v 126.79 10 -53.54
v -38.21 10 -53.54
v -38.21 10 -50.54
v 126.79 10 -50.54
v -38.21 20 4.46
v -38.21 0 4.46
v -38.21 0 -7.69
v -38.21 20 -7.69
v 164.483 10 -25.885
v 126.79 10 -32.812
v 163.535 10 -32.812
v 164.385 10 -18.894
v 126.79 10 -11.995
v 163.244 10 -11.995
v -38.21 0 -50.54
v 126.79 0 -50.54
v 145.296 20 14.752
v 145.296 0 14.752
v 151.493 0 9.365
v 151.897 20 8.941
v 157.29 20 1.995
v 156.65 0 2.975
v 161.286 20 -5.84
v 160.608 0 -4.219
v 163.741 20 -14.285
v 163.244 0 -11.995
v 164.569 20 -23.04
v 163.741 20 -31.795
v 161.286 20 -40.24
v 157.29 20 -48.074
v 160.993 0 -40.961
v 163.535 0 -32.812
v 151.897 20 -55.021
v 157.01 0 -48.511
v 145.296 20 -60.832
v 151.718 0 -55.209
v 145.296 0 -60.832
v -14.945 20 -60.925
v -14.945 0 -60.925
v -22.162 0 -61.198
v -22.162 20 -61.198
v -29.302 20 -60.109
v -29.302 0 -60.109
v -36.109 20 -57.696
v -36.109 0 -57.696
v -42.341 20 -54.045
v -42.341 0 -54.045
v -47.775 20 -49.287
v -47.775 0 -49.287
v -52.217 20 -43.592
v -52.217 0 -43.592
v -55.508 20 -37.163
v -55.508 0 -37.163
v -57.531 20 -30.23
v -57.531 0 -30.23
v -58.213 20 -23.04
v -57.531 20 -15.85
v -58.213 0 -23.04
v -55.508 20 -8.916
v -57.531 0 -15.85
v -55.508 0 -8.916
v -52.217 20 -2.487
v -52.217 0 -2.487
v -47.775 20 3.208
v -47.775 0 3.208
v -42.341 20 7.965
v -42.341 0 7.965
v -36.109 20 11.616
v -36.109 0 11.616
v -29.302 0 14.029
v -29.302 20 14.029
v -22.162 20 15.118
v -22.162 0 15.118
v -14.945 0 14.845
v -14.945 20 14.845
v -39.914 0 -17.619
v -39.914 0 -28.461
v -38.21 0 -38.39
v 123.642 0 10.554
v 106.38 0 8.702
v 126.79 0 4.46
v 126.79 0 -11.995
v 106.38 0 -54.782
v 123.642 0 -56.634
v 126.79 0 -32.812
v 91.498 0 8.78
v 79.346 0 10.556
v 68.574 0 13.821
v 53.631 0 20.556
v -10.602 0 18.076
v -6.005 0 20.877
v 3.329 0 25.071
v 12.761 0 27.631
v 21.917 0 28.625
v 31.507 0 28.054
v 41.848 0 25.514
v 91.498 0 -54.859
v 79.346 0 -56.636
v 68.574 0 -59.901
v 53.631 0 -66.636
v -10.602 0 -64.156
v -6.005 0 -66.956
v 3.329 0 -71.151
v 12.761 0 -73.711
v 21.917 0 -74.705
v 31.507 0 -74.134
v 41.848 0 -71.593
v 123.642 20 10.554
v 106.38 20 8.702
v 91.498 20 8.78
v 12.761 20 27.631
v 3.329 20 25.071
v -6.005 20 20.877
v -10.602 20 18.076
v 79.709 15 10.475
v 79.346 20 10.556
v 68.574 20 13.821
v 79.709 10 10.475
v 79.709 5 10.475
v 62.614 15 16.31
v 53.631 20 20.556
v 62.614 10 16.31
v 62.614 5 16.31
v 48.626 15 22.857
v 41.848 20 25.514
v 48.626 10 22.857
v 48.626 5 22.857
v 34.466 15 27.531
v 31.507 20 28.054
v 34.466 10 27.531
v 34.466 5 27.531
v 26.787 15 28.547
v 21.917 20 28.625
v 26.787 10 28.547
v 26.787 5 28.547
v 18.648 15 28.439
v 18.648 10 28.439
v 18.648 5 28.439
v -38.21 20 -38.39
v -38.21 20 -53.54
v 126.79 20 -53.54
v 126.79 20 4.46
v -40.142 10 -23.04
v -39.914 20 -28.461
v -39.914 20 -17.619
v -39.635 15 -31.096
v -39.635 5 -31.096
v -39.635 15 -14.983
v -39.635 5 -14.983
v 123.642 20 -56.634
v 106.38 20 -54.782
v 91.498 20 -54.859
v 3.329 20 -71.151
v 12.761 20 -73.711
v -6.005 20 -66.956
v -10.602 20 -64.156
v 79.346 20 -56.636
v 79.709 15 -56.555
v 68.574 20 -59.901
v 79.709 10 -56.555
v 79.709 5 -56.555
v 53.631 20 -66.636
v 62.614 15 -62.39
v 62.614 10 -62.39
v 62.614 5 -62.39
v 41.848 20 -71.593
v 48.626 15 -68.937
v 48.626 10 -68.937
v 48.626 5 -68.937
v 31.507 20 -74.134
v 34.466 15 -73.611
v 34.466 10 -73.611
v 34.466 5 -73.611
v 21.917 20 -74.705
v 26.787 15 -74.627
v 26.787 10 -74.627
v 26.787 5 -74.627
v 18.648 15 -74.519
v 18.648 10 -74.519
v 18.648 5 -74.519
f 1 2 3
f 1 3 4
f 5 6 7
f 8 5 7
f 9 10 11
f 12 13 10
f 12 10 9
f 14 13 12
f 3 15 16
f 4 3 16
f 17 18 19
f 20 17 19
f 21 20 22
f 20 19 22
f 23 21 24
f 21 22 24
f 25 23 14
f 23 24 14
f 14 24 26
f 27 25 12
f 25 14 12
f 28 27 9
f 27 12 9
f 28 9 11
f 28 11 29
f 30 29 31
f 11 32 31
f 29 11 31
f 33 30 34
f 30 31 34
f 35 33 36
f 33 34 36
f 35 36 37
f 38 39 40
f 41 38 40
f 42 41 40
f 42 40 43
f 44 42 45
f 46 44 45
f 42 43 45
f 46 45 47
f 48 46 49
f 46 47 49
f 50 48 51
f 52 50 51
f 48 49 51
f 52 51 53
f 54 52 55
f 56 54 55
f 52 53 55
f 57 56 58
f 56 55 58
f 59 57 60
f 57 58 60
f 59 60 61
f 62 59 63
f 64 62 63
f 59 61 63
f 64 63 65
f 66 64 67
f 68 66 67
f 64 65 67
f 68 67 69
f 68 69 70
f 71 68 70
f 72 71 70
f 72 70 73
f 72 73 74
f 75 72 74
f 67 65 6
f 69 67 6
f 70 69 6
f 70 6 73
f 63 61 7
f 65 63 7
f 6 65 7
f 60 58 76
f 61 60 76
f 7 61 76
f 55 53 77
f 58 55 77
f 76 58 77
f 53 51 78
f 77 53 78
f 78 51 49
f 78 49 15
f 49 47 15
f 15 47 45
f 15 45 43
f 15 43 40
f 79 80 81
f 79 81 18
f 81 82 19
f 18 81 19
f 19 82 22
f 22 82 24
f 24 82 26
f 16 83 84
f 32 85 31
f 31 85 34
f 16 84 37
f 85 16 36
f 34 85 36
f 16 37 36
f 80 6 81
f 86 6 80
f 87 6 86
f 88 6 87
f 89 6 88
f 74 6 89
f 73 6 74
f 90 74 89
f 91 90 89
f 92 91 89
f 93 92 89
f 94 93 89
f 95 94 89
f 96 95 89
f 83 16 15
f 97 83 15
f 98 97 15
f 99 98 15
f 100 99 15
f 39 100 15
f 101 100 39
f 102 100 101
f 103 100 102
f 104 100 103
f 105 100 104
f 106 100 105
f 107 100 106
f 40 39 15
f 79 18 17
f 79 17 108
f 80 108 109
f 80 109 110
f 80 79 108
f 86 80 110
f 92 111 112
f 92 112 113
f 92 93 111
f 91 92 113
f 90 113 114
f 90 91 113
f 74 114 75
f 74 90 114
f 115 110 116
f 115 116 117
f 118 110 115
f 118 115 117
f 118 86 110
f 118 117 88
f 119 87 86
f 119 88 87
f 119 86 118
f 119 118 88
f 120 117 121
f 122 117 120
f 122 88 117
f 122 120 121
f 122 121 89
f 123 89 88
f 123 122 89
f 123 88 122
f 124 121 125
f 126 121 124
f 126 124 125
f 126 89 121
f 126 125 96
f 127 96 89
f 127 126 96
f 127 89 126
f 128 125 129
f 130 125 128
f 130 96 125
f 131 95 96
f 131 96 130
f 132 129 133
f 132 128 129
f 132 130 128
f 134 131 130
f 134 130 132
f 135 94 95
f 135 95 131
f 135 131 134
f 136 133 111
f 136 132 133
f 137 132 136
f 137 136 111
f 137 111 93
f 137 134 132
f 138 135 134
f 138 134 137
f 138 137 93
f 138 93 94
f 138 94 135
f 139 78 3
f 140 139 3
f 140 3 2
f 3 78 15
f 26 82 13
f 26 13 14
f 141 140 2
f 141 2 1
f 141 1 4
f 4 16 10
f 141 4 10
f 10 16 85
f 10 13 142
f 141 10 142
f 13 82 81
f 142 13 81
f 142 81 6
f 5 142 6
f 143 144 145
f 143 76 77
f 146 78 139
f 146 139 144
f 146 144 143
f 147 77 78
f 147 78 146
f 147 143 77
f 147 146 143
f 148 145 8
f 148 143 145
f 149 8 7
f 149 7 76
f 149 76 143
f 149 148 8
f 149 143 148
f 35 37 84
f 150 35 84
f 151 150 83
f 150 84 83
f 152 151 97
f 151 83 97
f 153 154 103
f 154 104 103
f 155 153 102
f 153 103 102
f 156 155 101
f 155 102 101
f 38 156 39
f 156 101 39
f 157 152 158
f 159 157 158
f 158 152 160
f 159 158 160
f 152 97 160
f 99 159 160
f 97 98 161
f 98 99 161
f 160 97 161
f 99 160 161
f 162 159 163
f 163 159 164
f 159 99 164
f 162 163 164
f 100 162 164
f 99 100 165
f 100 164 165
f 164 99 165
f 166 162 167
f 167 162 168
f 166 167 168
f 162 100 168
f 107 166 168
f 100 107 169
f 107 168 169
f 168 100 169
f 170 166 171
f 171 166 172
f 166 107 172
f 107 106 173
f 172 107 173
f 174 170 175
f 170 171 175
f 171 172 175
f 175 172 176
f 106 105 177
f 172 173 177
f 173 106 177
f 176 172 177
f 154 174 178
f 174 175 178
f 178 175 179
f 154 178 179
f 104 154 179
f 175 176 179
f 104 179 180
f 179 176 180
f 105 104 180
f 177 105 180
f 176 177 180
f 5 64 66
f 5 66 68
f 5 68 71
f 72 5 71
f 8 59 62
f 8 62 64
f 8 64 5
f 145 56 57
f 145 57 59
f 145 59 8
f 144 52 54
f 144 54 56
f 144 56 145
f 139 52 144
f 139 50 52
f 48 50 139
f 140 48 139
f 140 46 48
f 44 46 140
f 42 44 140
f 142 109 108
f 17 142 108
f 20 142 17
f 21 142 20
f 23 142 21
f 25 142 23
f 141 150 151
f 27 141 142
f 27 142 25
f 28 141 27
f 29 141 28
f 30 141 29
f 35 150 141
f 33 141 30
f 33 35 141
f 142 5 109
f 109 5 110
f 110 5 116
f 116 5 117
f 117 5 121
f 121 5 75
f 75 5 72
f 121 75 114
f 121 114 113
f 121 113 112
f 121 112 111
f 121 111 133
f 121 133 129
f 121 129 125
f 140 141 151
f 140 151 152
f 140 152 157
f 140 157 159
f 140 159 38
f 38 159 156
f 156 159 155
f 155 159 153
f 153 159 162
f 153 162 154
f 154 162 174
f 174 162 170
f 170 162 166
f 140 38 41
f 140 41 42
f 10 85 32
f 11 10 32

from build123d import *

# Parameters (mm, degrees)
BOSS_EXTRUDE1_DEPTH = 20
SKETCH4_W           = 165
SKETCH4_H           = 3
CUT_EXTRUDE1_DEPTH  = 10
SKETCH9_W           = 41.41609898
SKETCH9_H           = 20.816936128
CUT_EXTRUDE2_DEPTH  = 10


with BuildPart() as part:
    # Sketch1 → Boss-Extrude1 (new body)
    with BuildSketch(Plane(origin=(0, 0, 0), x_dir=(1, 0, 0), z_dir=(0, 1, 0))):
        with BuildLine():
            add(Edge.make_bspline(
                [(145.295936906, 60.832177948), (44.156138469, 37.635123873), (68.598543861, 81.474917307), (14.861380224, 85.461006577), (-14.944677718, 60.924621218)],
                knots=[0, 0, 0, 0, 0, 1, 1, 1, 1, 1], degree=4))
            ThreePointArc((-14.944677718, 60.924621218), (-58.213287959, 23.039876711), (-14.944677718, -14.844867796))
            add(Edge.make_bspline(
                [(145.295936906, -14.752424526), (44.156138469, 8.444629549), (68.598543861, -35.395163885), (14.861380224, -39.381253155), (-14.944677718, -14.844867796)],
                knots=[0, 0, 0, 0, 0, 1, 1, 1, 1, 1], degree=4))
            ThreePointArc((145.295936906, -14.752424526), (164.569452441, 23.039876711), (145.295936906, 60.832177948))
        make_face()
        with BuildLine():
            Line((-38.21027036, -4.460123289), (-38.21027036, 7.689608728))
            add(Edge.make_bspline(
                [(-38.21027036, 38.390144694), (-42.352238314, 23.039876711), (-38.21027036, 7.689608728)],
                knots=[4.204471846, 4.204471846, 4.204471846, 5.220306115, 5.220306115, 5.220306115], degree=2, weights=[1, 0.873759421, 1]))
            Line((-38.21027036, 38.390144694), (-38.21027036, 50.539876711))
            Line((-38.21027036, 50.539876711), (126.78972964, 50.539876711))
            Line((126.78972964, 50.539876711), (126.78972964, -4.460123289))
            Line((126.78972964, -4.460123289), (-38.21027036, -4.460123289))
        make_face(mode=Mode.SUBTRACT)
    extrude(amount=BOSS_EXTRUDE1_DEPTH)

    # Sketch4 → Cut-Extrude1 (cut)
    with BuildSketch(Plane(origin=(0, 20, 0), x_dir=(1, 0, 0), z_dir=(0, 1, 0))):
        with Locations((44.28972964, 52.039876711)):
            Rectangle(SKETCH4_W, SKETCH4_H)
    extrude(amount=-CUT_EXTRUDE1_DEPTH, mode=Mode.SUBTRACT)

    # Sketch9 → Cut-Extrude2 (cut)
    with BuildSketch(Plane.XZ):
        with Locations((147.49777913, -22.403788733)):
            Rectangle(SKETCH9_W, SKETCH9_H)
    extrude(amount=-CUT_EXTRUDE2_DEPTH, mode=Mode.SUBTRACT)


solid = part.part
